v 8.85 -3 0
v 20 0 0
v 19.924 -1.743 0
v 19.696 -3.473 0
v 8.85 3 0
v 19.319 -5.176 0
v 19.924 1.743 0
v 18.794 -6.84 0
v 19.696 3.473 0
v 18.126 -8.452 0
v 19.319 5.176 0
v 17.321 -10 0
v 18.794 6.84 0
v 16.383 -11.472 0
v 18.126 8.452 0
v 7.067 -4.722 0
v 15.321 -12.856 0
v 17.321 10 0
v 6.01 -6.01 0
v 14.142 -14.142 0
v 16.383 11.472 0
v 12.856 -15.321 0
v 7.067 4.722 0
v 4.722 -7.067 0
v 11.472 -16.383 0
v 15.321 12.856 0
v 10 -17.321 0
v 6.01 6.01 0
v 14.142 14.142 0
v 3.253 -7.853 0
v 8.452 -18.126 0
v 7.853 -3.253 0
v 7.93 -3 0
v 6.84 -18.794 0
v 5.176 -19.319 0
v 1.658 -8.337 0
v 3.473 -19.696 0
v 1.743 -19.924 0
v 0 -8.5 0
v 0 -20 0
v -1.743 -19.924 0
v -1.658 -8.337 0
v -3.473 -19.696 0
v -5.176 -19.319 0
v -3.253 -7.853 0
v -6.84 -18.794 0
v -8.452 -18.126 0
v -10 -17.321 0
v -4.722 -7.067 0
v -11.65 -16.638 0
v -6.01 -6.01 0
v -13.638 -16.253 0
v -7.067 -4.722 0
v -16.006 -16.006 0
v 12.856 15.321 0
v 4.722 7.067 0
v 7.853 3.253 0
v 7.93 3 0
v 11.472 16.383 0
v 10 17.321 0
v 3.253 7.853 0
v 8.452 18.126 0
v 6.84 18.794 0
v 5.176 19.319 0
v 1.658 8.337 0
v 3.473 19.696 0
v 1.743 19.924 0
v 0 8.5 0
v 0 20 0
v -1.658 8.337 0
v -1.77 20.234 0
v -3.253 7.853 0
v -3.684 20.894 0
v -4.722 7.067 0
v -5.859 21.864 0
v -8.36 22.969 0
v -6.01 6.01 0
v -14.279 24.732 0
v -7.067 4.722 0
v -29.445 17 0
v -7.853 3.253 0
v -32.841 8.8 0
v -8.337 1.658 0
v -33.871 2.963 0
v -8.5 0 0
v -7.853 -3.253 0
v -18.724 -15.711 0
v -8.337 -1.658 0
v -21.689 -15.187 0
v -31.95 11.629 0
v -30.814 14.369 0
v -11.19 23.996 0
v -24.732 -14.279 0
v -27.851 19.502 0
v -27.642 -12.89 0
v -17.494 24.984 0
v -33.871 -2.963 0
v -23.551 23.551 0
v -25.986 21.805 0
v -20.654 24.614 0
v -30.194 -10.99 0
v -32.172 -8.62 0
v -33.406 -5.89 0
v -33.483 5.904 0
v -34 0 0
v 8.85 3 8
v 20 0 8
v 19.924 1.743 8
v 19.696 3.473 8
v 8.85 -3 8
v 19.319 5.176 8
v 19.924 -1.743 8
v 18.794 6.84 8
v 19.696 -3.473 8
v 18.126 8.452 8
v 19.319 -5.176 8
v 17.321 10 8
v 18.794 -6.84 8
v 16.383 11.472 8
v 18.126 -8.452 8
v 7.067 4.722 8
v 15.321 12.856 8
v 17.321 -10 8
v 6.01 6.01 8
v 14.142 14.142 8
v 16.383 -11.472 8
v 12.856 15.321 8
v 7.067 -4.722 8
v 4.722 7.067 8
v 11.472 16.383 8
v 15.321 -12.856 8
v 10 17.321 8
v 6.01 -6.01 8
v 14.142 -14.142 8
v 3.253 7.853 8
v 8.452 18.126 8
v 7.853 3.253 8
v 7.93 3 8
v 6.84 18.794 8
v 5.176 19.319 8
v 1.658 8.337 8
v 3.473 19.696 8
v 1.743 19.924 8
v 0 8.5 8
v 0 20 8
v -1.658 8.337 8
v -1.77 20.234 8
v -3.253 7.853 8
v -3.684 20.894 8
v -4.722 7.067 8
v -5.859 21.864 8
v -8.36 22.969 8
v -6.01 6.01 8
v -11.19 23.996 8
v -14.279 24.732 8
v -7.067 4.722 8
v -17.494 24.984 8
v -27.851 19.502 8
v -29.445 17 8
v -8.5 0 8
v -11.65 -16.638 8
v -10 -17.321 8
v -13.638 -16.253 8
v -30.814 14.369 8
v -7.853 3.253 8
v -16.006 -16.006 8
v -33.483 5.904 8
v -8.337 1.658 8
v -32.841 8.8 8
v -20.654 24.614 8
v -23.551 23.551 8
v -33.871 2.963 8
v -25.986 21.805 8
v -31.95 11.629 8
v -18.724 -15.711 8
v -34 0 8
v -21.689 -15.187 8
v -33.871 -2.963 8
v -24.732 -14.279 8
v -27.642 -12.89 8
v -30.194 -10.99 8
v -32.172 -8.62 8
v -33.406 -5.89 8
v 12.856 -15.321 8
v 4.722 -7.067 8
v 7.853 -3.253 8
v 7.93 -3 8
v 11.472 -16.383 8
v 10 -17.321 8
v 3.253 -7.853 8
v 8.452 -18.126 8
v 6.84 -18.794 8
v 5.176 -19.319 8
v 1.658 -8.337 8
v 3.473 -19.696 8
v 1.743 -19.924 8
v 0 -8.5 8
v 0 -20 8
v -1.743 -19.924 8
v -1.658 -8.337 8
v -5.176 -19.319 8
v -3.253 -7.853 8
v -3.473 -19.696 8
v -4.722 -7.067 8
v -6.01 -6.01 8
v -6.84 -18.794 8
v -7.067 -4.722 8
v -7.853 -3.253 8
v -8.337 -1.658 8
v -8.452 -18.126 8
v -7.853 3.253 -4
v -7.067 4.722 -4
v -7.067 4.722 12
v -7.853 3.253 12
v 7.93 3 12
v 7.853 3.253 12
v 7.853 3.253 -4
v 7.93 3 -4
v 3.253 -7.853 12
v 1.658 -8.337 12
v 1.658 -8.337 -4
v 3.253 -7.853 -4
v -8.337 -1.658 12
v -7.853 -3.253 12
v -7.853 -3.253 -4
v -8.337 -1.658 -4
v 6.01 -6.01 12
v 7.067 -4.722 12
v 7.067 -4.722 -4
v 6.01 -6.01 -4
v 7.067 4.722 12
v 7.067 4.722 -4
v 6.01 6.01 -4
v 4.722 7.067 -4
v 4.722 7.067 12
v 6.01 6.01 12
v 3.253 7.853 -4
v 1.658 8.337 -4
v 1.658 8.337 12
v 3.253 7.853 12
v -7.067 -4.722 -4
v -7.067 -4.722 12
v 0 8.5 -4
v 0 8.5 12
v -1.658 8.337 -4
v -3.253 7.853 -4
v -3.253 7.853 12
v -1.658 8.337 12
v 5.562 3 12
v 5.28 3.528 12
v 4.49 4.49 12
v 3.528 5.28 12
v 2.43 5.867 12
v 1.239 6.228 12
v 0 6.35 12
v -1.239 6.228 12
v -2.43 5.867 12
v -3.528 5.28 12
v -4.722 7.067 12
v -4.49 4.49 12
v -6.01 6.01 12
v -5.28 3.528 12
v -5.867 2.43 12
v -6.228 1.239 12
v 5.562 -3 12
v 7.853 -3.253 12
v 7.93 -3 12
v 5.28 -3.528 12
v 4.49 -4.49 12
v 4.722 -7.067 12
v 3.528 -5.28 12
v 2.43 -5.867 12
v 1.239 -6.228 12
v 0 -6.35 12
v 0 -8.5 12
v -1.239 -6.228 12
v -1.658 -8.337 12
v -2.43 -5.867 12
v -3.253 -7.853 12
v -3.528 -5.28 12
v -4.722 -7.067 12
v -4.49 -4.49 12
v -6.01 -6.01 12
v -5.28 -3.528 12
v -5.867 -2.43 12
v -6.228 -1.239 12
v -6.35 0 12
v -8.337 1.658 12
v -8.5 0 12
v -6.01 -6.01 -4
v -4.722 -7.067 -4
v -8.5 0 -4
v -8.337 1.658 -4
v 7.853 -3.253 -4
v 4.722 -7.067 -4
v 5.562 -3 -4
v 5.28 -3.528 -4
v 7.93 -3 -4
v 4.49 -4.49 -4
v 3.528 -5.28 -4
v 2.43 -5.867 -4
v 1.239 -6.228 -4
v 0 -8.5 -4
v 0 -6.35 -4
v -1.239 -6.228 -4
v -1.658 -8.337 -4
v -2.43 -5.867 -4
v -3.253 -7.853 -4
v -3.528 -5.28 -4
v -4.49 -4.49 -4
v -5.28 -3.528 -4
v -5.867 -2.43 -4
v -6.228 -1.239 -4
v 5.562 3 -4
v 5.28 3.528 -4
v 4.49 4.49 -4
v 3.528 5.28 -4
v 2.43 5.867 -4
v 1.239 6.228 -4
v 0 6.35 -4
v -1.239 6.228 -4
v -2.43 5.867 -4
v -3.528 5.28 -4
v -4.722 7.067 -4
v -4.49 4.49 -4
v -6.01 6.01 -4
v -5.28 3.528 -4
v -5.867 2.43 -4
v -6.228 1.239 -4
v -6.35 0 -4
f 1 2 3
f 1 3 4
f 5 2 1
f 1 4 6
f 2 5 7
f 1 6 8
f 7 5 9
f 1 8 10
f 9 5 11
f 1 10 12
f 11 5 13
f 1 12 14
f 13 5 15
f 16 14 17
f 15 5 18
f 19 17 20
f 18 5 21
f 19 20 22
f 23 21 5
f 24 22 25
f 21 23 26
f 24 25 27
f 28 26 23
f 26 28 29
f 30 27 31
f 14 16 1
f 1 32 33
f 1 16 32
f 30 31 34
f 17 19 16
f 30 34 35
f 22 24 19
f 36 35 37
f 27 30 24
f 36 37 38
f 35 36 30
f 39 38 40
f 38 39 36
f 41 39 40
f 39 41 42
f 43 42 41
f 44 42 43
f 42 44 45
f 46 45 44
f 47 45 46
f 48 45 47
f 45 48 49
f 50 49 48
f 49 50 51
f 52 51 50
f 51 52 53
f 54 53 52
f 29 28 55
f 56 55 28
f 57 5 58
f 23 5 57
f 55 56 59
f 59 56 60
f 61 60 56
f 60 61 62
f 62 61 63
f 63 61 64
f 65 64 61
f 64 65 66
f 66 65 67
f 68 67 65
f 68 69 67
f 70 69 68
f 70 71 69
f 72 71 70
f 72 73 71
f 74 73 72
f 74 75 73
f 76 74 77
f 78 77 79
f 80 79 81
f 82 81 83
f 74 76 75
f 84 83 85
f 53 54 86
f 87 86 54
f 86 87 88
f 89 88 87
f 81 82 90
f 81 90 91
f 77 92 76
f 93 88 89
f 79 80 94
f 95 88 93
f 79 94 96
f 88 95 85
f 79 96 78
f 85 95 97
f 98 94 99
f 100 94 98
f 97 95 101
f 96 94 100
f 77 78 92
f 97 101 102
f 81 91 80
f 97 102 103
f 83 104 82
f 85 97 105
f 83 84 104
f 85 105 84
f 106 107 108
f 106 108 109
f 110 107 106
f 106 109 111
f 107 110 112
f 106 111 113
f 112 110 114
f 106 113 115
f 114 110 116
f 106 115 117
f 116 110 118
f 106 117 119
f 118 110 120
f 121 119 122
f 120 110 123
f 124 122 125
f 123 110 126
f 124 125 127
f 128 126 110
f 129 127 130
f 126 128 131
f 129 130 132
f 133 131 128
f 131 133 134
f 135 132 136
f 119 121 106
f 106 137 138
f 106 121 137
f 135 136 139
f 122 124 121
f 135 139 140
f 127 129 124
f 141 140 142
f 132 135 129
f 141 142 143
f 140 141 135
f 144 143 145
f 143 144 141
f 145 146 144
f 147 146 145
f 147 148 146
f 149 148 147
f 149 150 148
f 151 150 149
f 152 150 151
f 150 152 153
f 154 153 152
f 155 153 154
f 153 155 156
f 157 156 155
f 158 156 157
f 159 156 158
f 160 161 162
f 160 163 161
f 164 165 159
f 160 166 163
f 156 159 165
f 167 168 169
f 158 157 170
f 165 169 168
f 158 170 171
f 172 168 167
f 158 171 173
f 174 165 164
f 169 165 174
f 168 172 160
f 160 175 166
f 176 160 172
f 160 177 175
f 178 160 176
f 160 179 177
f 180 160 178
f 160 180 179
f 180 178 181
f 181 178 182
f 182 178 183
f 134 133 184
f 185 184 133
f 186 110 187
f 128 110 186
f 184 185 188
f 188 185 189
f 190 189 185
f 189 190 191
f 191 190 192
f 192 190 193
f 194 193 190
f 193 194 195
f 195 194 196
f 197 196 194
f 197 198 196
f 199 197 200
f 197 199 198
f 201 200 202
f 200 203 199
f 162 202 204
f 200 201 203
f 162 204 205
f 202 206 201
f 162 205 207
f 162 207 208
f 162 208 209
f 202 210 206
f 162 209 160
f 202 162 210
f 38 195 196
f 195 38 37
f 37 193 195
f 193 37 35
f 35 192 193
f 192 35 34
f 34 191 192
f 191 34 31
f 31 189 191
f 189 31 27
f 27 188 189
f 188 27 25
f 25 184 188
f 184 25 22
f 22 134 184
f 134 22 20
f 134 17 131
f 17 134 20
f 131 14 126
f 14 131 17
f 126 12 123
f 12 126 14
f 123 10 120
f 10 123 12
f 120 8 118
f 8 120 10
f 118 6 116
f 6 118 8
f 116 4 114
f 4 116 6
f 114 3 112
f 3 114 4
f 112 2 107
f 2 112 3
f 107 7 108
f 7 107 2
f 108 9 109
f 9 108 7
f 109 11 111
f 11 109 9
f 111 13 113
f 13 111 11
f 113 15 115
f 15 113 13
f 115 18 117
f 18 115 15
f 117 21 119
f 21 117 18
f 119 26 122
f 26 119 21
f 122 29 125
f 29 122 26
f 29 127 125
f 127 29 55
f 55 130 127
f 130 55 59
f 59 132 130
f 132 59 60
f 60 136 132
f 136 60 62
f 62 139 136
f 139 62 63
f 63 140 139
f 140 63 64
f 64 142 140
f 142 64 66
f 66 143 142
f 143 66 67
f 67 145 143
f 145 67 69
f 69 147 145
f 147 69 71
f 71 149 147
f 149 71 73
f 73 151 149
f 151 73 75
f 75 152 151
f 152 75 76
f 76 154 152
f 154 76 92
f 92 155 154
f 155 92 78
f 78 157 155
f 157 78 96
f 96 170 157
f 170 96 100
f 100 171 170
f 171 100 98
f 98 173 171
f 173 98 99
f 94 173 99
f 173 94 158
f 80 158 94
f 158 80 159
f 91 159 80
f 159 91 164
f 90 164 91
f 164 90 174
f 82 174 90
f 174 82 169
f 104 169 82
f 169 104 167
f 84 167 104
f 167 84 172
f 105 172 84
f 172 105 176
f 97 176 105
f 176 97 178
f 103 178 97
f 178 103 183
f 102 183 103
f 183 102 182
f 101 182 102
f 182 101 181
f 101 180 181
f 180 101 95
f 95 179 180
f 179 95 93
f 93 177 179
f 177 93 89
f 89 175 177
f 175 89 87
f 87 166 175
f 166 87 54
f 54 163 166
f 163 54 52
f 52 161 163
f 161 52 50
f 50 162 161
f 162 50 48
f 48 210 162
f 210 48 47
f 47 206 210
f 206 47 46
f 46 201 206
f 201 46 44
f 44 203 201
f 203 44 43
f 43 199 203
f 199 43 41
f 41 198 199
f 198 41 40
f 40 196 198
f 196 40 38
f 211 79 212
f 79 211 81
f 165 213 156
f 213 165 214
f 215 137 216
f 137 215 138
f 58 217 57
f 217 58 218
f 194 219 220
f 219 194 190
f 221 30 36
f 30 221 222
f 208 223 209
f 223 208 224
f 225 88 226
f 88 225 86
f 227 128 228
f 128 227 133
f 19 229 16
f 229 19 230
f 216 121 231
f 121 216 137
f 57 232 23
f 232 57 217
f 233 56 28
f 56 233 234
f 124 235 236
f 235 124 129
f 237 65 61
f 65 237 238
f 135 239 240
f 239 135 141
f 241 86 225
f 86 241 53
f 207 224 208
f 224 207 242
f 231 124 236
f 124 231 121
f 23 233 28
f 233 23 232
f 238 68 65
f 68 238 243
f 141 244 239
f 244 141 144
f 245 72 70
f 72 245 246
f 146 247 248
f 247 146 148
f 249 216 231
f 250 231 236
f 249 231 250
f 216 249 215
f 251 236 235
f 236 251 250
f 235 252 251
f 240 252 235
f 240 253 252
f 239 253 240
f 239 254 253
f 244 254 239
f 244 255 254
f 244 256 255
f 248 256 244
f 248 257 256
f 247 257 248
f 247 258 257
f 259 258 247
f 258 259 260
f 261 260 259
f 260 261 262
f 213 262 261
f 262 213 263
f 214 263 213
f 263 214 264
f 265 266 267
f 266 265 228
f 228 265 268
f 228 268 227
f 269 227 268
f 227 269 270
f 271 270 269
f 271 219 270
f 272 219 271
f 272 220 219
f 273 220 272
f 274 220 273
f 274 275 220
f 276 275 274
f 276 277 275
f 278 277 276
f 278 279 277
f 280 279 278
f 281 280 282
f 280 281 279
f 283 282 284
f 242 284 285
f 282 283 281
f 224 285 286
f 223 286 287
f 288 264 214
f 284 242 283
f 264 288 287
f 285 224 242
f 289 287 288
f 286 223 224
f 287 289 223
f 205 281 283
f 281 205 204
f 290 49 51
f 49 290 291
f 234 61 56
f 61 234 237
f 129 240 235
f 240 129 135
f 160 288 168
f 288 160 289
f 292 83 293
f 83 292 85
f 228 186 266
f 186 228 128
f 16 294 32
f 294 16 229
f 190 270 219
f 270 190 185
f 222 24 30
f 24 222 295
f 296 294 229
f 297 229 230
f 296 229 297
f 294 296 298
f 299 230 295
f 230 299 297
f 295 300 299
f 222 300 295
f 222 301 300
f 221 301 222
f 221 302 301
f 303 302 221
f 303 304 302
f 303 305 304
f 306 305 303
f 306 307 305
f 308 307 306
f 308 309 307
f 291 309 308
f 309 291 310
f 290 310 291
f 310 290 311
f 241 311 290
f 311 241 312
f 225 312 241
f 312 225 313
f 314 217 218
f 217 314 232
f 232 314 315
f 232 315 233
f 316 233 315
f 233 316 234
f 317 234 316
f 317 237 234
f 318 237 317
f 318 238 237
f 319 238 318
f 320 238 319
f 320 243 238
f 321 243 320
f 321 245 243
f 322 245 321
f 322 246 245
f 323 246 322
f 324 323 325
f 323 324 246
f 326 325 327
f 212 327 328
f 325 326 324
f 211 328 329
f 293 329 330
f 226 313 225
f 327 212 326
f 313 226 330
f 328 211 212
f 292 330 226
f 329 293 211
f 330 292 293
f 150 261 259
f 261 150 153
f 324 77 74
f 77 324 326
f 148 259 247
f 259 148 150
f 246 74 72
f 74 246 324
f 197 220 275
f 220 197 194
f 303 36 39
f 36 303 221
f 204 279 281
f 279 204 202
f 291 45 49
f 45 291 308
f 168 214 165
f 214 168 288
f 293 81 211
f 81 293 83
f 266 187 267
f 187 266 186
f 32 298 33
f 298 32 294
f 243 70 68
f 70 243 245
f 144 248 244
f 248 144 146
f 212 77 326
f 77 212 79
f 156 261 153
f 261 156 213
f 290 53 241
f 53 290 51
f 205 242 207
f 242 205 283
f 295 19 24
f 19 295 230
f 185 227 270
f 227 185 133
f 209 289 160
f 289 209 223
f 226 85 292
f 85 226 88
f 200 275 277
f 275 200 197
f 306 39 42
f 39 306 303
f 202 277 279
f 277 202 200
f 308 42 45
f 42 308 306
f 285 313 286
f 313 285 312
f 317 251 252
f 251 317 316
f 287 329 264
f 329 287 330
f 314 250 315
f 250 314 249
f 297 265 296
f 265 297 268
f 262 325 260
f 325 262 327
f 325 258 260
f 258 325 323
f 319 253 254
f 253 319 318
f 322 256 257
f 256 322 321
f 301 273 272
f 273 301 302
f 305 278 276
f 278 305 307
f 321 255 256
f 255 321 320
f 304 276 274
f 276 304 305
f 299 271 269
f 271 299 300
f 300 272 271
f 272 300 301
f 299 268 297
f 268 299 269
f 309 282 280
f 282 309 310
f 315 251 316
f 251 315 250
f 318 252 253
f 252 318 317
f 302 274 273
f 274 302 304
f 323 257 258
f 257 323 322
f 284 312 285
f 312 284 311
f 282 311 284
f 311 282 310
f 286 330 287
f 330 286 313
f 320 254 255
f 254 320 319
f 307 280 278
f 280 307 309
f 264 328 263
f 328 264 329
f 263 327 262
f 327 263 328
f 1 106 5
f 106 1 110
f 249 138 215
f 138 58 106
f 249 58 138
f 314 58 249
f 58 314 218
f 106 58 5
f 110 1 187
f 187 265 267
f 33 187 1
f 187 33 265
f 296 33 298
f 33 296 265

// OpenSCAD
$fn = 32;

// ----------------------------------------------------------------------
// Cam: base radius 20 mm with a 14 mm lift over 150 degrees
// ----------------------------------------------------------------------

// --- parameters (mm) ---
base_r = 20;              // base radius
lift = 14;                // lift height above the base radius
lift_span = 150;          // angular width of the lift
lift_start = 90;          // angle where the lift starts
cam_t = 8;                // cam plate thickness
hub_d = 17;               // hub diameter
hub_h = 16;               // hub height
bore_d = 12.7;            // bore
key_w = 6;                // keyway width
key_depth = 1.6;          // keyway depth

cam_profile = [[20, 0], [19.924, 1.743], [19.696, 3.473], [19.319, 5.176], [18.794, 6.84], [18.126, 8.452], [17.321, 10], [16.383, 11.472], [15.321, 12.856], [14.142, 14.142], [12.856, 15.321], [11.472, 16.383], [10, 17.321], [8.452, 18.126], [6.84, 18.794], [5.176, 19.319], [3.473, 19.696], [1.743, 19.924], [0, 20], [-1.77, 20.234], [-3.684, 20.894], [-5.859, 21.864], [-8.36, 22.969], [-11.19, 23.996], [-14.279, 24.732], [-17.494, 24.984], [-20.654, 24.614], [-23.551, 23.551], [-25.986, 21.805], [-27.851, 19.502], [-29.445, 17], [-30.814, 14.369], [-31.95, 11.629], [-32.841, 8.8], [-33.483, 5.904], [-33.871, 2.963], [-34, 0], [-33.871, -2.963], [-33.406, -5.89], [-32.172, -8.62], [-30.194, -10.99], [-27.642, -12.89], [-24.732, -14.279], [-21.689, -15.187], [-18.724, -15.711], [-16.006, -16.006], [-13.638, -16.253], [-11.65, -16.638], [-10, -17.321], [-8.452, -18.126], [-6.84, -18.794], [-5.176, -19.319], [-3.473, -19.696], [-1.743, -19.924], [0, -20], [1.743, -19.924], [3.473, -19.696], [5.176, -19.319], [6.84, -18.794], [8.452, -18.126], [10, -17.321], [11.472, -16.383], [12.856, -15.321], [14.142, -14.142], [15.321, -12.856], [16.383, -11.472], [17.321, -10], [18.126, -8.452], [18.794, -6.84], [19.319, -5.176], [19.696, -3.473], [19.924, -1.743]];

difference() {
  union() {
    linear_extrude(height = cam_t) polygon(cam_profile);
    /* hub, proud of the cam plate on both sides */
    translate([0, 0, -4]) cylinder(h = hub_h, d = hub_d);
  }
  /* bore through the hub, 2.5 mm clear on both faces */
  translate([0, 0, -6.5]) cylinder(h = hub_h + 5, d = bore_d);
  /* keyway, milled through the whole hub */
  translate([4.75, -3, -6.5]) cube([4.1, 6, 21]);
}
